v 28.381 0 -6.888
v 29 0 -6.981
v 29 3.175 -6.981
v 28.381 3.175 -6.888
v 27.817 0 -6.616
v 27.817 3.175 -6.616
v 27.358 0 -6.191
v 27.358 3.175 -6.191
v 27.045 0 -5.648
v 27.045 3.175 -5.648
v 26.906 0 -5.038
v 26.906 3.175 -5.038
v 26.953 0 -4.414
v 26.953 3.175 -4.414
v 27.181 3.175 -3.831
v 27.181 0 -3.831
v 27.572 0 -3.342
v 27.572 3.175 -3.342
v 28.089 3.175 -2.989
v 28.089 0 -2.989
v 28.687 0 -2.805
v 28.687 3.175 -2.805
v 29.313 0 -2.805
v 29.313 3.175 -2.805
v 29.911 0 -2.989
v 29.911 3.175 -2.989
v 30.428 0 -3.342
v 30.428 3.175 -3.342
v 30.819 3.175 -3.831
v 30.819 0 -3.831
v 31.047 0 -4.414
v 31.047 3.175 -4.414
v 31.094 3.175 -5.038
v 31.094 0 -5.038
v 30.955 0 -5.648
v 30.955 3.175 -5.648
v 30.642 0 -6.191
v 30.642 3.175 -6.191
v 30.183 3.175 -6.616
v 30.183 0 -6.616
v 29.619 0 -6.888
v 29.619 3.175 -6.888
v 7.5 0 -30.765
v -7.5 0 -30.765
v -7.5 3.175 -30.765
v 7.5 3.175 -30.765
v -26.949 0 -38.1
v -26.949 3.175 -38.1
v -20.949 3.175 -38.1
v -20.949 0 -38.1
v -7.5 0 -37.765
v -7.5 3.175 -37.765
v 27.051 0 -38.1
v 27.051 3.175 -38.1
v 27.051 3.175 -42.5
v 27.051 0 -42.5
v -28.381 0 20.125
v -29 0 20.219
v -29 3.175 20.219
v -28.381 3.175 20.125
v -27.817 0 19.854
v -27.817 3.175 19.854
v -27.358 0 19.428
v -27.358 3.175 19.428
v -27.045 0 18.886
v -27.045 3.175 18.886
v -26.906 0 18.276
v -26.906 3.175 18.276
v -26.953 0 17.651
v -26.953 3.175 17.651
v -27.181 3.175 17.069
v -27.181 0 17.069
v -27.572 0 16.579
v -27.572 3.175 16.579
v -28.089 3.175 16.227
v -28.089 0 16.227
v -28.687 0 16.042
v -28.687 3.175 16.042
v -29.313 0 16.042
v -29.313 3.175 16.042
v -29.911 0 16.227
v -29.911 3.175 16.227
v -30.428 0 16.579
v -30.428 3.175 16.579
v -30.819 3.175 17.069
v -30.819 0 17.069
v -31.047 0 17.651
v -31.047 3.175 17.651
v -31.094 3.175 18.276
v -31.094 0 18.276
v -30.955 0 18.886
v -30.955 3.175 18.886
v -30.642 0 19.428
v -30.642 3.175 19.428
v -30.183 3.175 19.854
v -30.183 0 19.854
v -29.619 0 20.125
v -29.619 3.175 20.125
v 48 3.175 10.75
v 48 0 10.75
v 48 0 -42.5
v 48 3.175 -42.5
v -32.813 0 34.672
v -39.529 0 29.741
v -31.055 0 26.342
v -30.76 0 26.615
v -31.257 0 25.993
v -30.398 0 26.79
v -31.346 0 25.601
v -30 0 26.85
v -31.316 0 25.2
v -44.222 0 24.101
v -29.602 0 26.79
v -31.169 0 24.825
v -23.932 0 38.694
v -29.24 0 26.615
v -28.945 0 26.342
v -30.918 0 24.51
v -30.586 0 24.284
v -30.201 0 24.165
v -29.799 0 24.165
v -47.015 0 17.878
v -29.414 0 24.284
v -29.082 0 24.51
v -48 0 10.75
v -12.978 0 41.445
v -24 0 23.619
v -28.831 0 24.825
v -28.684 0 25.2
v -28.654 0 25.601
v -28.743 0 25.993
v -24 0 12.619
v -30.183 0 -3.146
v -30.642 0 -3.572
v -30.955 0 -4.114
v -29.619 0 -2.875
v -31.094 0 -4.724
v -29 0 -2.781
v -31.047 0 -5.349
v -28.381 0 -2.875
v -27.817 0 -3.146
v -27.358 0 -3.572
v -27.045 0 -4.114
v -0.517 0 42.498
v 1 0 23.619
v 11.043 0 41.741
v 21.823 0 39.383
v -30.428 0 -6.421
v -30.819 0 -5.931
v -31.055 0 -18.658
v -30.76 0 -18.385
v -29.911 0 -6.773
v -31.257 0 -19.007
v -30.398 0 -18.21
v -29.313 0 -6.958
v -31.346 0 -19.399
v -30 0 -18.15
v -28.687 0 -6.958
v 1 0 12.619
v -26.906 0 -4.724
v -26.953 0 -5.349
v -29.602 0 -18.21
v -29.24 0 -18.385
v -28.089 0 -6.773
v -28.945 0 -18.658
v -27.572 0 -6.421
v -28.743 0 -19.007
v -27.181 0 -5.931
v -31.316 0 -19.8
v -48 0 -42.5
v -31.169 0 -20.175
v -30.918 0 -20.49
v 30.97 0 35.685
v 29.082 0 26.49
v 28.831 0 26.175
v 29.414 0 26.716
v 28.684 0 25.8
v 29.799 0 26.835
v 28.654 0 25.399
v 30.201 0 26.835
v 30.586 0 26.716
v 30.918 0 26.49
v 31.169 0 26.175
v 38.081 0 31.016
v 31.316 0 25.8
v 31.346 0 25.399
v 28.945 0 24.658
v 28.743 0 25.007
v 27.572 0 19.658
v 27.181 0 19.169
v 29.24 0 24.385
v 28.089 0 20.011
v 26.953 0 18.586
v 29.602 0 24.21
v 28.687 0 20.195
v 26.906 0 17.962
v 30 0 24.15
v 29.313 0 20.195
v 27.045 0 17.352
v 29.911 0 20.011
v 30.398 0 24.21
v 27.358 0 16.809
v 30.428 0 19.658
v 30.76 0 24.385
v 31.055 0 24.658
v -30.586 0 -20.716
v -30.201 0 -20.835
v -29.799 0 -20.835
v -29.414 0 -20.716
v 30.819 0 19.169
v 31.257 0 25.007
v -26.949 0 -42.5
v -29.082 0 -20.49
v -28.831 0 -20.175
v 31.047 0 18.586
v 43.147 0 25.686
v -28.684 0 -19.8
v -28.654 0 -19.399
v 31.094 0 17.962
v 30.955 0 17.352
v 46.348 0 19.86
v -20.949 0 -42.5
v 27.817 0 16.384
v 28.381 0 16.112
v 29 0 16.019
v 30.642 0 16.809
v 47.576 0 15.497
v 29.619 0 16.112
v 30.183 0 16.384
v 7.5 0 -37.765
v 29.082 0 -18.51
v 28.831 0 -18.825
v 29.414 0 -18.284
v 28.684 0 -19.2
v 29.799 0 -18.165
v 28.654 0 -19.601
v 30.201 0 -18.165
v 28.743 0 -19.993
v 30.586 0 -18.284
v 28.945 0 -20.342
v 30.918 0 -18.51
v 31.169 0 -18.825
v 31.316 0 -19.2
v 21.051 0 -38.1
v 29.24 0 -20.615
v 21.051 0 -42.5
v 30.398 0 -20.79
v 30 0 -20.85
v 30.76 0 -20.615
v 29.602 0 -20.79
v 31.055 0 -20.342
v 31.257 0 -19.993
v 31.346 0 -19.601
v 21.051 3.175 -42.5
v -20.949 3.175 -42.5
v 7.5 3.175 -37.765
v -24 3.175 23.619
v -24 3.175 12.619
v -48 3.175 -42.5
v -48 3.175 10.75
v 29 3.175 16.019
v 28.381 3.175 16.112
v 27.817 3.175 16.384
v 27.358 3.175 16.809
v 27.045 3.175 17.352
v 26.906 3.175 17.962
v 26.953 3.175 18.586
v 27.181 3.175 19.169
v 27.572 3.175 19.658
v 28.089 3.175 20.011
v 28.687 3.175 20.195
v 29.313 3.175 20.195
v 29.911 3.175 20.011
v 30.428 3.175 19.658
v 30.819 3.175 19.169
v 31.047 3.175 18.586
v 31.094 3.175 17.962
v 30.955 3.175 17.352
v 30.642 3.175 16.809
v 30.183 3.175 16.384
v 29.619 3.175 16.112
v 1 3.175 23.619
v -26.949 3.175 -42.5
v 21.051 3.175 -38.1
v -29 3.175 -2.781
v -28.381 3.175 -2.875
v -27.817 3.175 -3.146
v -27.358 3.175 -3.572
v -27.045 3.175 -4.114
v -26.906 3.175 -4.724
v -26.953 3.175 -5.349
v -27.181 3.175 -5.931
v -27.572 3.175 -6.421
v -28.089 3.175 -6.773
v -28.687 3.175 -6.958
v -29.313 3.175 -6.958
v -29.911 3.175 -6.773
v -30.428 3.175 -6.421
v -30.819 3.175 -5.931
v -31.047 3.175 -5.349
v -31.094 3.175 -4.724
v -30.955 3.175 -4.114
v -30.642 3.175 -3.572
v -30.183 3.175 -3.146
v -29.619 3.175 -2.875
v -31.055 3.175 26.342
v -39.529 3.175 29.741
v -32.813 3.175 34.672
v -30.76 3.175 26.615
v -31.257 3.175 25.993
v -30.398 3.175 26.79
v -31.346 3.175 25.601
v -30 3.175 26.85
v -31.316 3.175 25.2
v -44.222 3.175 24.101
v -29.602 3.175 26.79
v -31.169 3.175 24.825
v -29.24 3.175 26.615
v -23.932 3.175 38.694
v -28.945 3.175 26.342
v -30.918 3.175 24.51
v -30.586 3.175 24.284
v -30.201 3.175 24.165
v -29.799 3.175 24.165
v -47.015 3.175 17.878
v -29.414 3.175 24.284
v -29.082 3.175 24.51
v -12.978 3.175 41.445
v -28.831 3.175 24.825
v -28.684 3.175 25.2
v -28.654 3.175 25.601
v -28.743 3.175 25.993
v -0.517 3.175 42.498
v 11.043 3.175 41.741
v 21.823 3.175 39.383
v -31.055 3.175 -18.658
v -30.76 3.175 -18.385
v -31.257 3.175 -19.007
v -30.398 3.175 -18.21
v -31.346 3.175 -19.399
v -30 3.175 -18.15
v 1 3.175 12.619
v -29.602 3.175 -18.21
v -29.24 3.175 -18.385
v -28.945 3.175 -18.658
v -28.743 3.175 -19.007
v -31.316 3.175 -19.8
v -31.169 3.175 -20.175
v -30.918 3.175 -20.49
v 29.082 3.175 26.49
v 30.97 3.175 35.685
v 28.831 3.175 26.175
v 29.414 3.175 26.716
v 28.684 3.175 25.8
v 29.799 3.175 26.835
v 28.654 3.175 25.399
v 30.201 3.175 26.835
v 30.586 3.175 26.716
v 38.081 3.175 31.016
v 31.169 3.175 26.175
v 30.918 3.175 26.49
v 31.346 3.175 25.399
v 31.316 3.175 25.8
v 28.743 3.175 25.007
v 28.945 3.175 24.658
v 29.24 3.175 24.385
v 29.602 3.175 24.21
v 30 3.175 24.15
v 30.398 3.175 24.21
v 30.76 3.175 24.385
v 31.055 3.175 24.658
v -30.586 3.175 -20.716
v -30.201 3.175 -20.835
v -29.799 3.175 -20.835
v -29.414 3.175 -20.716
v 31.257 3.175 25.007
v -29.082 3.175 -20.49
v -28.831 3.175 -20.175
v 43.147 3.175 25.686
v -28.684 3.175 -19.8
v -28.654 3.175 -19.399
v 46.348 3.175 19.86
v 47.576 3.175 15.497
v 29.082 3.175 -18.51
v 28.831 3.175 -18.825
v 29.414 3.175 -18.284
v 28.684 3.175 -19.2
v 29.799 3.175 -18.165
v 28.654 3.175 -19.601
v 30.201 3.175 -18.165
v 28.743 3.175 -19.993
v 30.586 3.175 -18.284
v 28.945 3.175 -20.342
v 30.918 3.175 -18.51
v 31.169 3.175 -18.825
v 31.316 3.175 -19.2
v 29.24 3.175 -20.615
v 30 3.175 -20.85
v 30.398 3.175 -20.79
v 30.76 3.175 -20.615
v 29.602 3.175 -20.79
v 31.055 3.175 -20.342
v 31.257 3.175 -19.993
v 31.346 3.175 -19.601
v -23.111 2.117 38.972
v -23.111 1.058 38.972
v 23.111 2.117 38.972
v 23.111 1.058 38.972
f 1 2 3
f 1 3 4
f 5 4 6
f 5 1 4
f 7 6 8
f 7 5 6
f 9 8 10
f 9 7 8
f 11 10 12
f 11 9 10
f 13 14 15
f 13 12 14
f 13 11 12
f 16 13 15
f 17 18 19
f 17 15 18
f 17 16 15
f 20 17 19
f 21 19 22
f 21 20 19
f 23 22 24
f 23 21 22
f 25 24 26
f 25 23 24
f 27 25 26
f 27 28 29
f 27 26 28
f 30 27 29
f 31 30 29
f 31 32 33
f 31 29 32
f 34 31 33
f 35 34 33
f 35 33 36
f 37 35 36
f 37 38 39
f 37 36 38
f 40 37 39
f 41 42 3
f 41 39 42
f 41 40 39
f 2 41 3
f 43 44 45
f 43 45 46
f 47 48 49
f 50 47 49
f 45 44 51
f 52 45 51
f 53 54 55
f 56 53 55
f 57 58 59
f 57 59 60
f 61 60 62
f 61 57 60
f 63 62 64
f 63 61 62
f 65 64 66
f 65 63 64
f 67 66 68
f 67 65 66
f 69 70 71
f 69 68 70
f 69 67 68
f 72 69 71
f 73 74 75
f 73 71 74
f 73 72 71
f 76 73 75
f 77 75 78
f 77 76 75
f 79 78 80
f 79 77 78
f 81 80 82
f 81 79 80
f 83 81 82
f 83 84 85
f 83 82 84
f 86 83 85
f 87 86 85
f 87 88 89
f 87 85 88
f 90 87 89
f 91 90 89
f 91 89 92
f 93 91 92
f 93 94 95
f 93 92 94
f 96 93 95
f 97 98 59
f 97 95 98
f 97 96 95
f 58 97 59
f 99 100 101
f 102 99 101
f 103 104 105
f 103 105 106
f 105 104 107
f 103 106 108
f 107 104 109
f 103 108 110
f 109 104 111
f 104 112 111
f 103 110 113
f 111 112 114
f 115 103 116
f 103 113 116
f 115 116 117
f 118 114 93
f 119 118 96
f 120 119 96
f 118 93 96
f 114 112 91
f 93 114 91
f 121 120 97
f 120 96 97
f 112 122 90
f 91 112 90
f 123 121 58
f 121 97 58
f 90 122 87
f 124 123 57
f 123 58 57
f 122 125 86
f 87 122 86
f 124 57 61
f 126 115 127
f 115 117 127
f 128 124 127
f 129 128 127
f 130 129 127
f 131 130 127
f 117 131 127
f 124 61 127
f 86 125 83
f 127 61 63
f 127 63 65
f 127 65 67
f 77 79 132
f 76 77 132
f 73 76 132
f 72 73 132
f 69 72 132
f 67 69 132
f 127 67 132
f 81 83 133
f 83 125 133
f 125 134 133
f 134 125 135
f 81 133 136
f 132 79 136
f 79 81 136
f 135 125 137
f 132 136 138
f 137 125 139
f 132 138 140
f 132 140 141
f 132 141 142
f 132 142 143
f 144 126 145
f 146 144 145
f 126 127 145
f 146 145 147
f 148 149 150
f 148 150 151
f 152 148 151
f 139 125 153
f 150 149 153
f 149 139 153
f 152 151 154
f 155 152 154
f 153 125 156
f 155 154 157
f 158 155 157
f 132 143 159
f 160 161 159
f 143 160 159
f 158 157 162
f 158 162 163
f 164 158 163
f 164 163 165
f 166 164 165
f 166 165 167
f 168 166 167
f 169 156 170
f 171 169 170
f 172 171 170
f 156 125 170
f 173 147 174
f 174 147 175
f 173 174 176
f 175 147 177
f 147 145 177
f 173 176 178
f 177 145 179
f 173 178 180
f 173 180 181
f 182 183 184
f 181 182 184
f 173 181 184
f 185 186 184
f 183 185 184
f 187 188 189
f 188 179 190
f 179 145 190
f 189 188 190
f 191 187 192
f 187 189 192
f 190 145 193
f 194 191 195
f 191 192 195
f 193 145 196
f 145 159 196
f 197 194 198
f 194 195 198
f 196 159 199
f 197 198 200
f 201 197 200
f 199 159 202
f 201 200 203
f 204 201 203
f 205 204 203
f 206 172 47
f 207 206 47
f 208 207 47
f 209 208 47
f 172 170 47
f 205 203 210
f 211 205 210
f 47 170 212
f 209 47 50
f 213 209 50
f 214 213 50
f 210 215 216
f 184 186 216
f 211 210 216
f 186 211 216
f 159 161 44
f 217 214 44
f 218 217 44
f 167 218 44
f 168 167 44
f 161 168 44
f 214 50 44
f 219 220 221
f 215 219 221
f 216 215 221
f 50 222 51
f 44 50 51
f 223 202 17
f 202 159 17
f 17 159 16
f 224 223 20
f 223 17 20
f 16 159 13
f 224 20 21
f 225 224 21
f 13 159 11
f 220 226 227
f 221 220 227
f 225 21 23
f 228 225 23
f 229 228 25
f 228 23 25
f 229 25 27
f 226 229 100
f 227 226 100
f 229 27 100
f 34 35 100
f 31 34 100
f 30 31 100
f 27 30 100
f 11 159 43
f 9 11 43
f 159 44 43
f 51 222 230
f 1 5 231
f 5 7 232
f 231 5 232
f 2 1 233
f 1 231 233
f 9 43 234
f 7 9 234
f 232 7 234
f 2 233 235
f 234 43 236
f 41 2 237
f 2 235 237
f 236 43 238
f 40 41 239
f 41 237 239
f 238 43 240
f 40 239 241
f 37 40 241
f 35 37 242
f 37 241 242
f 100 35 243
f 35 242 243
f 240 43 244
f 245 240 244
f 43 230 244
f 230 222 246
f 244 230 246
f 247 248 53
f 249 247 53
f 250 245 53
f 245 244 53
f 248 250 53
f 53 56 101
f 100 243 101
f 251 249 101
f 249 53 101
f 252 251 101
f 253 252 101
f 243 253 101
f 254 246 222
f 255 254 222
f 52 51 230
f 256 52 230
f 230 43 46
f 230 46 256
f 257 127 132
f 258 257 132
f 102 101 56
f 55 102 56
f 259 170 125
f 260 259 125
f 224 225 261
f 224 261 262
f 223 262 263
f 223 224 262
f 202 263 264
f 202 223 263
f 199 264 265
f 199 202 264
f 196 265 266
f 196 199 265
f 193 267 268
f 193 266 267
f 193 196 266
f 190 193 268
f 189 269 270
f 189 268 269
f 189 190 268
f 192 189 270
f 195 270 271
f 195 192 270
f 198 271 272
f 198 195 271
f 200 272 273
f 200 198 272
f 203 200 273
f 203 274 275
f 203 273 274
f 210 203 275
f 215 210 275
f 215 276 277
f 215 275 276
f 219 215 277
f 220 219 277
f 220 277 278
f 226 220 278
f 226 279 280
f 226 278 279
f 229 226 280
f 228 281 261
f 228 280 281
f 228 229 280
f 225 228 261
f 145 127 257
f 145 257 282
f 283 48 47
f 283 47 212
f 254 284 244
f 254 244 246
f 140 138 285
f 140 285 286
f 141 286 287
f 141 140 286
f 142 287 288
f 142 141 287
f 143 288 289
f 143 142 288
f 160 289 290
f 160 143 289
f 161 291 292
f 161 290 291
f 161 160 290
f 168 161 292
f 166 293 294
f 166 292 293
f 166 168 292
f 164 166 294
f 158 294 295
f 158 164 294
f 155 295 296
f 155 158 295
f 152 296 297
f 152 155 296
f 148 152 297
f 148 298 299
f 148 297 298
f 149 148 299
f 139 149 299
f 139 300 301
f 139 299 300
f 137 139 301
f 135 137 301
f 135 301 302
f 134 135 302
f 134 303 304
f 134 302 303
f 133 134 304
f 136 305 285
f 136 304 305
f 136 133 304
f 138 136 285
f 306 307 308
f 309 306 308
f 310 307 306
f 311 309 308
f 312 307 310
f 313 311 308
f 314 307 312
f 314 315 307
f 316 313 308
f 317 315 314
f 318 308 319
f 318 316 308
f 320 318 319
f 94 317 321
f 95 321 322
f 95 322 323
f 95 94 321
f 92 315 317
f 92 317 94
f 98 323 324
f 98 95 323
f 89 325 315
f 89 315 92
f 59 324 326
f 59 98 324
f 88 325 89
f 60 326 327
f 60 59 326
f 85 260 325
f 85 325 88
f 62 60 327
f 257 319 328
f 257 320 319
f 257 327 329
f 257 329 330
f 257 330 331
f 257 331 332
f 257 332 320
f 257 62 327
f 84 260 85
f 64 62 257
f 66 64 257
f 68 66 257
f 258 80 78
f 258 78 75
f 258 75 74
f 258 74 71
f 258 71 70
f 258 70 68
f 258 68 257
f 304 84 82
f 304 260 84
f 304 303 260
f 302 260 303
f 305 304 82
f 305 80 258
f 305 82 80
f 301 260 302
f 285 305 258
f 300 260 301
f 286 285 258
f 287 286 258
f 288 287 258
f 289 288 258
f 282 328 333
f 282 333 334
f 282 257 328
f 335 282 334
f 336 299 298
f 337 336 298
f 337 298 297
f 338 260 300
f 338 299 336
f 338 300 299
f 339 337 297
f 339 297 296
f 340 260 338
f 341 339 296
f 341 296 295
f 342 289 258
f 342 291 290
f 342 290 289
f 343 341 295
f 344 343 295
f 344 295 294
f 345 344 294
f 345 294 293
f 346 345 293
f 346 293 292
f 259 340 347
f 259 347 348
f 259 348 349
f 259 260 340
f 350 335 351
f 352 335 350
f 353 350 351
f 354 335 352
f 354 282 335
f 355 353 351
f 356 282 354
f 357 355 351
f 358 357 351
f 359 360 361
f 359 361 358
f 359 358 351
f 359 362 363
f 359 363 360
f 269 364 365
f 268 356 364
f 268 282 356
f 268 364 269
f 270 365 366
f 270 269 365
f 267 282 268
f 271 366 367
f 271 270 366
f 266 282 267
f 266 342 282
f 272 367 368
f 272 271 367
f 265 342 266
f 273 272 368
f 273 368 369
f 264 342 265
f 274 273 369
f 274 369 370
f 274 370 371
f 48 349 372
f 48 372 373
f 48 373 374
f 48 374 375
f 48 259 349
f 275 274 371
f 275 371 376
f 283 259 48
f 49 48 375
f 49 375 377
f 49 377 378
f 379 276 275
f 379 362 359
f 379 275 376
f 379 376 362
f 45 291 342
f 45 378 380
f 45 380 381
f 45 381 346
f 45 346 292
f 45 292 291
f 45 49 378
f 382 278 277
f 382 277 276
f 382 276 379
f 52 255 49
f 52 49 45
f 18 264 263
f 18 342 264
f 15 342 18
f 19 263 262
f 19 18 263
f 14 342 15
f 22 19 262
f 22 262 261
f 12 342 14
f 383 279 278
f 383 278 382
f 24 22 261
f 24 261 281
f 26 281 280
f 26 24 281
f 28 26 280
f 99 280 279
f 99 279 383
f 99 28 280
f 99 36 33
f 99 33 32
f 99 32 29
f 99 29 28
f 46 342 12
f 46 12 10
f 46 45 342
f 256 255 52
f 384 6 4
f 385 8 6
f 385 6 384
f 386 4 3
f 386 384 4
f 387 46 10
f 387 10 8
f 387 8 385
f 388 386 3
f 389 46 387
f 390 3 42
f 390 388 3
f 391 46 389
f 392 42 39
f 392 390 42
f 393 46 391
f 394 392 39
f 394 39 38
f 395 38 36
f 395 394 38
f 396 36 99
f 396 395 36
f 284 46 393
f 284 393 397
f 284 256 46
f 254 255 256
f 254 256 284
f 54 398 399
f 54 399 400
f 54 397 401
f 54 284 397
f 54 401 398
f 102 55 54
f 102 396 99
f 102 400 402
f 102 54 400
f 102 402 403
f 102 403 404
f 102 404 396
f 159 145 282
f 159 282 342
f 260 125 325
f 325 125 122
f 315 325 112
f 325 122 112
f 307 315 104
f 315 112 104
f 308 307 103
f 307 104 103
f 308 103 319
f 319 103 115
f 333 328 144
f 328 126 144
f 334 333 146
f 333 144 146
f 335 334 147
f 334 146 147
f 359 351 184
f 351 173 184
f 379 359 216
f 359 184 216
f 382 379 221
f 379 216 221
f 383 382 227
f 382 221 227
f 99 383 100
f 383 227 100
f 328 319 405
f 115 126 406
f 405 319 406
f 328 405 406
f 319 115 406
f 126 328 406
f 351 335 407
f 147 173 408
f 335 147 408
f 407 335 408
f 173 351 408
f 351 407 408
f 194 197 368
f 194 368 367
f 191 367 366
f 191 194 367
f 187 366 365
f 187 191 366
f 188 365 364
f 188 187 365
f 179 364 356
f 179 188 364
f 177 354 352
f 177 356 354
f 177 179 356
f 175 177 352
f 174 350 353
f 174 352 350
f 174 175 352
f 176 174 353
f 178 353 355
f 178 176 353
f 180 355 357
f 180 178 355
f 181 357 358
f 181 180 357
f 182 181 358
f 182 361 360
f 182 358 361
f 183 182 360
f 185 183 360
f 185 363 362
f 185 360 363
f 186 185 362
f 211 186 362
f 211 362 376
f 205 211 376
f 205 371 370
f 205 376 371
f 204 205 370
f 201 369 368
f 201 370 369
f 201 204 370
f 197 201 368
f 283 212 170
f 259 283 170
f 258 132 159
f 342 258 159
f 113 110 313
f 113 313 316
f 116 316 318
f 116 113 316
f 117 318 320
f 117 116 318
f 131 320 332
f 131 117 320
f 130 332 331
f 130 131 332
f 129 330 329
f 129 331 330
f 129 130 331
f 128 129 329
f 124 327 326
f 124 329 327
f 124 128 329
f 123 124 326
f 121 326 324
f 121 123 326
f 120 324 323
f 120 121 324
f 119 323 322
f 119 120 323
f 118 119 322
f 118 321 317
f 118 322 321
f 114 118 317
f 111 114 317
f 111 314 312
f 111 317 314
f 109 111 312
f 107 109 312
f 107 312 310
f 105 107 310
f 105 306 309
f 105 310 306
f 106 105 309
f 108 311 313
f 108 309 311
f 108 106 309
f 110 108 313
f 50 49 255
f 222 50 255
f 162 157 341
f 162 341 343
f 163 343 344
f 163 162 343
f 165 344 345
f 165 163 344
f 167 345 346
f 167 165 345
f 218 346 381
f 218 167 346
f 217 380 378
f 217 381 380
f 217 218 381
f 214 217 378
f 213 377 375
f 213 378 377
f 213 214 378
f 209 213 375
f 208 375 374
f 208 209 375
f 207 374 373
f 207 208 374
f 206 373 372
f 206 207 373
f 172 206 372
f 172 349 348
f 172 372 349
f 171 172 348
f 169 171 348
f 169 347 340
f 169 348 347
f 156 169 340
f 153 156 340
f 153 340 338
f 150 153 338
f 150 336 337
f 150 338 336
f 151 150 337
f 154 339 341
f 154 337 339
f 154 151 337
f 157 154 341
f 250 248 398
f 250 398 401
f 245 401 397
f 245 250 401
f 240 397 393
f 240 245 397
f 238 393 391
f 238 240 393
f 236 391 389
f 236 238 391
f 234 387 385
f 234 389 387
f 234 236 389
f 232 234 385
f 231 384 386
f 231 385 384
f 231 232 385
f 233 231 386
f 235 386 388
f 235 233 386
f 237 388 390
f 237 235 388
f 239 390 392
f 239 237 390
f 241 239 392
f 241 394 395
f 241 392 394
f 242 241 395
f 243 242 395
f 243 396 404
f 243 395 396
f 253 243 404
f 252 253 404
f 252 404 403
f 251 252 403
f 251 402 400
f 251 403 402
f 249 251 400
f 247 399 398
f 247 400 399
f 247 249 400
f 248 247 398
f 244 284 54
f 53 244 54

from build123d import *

# Parameters (mm, degrees)
BOSS_EXTRUDE1_DEPTH     = 3.175
CUT_EXTRUDE1_DEPTH      = 65.189801711
CUT_EXTRUDE1_DEPTH_BACK = 65.189801711
SKETCH3_R               = 1.35
SKETCH3_R_2             = 2.1
SKETCH3_W               = 15
SKETCH3_H               = 7
SKETCH3_W_2             = 25
SKETCH3_H_2             = 11
SKETCH5_W               = 6
SKETCH5_H               = 4.4
CUT_EXTRUDE2_DEPTH      = 65.189801711


with BuildPart() as part:
    # Sketch2 → Boss-Extrude1 (new body)
    with BuildSketch(Plane(origin=(0, 0, 0), x_dir=(1, 0, 0), z_dir=(0, 1, 0))):
        with BuildLine():
            Line((48, 42.5), (-48, 42.5))
            Line((-48, 42.5), (-48, -10.75))
            add(Edge.make_bspline(
                [(-48, -10.75), (-48, -53.083333333), (48, -53.083333333), (48, -10.75)],
                knots=[0, 0, 0, 0, 1, 1, 1, 1], degree=3))
            Line((48, -10.75), (48, 42.5))
        make_face()
    extrude(amount=BOSS_EXTRUDE1_DEPTH)

    # Sketch3 → Cut-Extrude1 (cut, two sides: drawn at the far end of the back side and taken through both)
    with BuildSketch(Plane(origin=(0, 3.175, 0), x_dir=(1, 0, 0), z_dir=(0, 1, 0)).offset(-CUT_EXTRUDE1_DEPTH_BACK)):
        with Locations(Location((-30, 19.5, 0), (0, 0, 270))):
            Circle(SKETCH3_R)
        with Locations(Location((-30, -25.5, 0), (0, 0, 270))):
            Circle(SKETCH3_R)
        with Locations(Location((30, -25.5, 0), (0, 0, 90))):
            Circle(SKETCH3_R)
        with Locations(Location((30, 19.5, 0), (0, 0, 90))):
            Circle(SKETCH3_R)
        with Locations(Location((-29, 4.881263298, 0), (0, 0, 270))):
            Circle(SKETCH3_R_2)
        with Locations(Location((-29, -18.118736702, 0), (0, 0, 270))):
            Circle(SKETCH3_R_2)
        with Locations(Location((29, -18.118736702, 0), (0, 0, 90))):
            Circle(SKETCH3_R_2)
        with Locations(Location((29, 4.881263298, 0), (0, 0, 90))):
            Circle(SKETCH3_R_2)
        with Locations((0, 34.265048758)):
            Rectangle(SKETCH3_W, SKETCH3_H)
        with Locations((-11.5, -18.118736702)):
            Rectangle(SKETCH3_W_2, SKETCH3_H_2)
    extrude(amount=CUT_EXTRUDE1_DEPTH + CUT_EXTRUDE1_DEPTH_BACK, mode=Mode.SUBTRACT)

    # Sketch5 → Cut-Extrude2 (cut, through all)
    with BuildSketch(Plane(origin=(0, 3.175, 0), x_dir=(1, 0, 0), z_dir=(0, 1, 0))):
        with Locations((24.051144599, 40.3)):
            Rectangle(SKETCH5_W, SKETCH5_H)
        with Locations((-23.948855401, 40.3)):
            Rectangle(SKETCH5_W, SKETCH5_H)
    extrude(amount=-CUT_EXTRUDE2_DEPTH, mode=Mode.SUBTRACT)


solid = part.part
